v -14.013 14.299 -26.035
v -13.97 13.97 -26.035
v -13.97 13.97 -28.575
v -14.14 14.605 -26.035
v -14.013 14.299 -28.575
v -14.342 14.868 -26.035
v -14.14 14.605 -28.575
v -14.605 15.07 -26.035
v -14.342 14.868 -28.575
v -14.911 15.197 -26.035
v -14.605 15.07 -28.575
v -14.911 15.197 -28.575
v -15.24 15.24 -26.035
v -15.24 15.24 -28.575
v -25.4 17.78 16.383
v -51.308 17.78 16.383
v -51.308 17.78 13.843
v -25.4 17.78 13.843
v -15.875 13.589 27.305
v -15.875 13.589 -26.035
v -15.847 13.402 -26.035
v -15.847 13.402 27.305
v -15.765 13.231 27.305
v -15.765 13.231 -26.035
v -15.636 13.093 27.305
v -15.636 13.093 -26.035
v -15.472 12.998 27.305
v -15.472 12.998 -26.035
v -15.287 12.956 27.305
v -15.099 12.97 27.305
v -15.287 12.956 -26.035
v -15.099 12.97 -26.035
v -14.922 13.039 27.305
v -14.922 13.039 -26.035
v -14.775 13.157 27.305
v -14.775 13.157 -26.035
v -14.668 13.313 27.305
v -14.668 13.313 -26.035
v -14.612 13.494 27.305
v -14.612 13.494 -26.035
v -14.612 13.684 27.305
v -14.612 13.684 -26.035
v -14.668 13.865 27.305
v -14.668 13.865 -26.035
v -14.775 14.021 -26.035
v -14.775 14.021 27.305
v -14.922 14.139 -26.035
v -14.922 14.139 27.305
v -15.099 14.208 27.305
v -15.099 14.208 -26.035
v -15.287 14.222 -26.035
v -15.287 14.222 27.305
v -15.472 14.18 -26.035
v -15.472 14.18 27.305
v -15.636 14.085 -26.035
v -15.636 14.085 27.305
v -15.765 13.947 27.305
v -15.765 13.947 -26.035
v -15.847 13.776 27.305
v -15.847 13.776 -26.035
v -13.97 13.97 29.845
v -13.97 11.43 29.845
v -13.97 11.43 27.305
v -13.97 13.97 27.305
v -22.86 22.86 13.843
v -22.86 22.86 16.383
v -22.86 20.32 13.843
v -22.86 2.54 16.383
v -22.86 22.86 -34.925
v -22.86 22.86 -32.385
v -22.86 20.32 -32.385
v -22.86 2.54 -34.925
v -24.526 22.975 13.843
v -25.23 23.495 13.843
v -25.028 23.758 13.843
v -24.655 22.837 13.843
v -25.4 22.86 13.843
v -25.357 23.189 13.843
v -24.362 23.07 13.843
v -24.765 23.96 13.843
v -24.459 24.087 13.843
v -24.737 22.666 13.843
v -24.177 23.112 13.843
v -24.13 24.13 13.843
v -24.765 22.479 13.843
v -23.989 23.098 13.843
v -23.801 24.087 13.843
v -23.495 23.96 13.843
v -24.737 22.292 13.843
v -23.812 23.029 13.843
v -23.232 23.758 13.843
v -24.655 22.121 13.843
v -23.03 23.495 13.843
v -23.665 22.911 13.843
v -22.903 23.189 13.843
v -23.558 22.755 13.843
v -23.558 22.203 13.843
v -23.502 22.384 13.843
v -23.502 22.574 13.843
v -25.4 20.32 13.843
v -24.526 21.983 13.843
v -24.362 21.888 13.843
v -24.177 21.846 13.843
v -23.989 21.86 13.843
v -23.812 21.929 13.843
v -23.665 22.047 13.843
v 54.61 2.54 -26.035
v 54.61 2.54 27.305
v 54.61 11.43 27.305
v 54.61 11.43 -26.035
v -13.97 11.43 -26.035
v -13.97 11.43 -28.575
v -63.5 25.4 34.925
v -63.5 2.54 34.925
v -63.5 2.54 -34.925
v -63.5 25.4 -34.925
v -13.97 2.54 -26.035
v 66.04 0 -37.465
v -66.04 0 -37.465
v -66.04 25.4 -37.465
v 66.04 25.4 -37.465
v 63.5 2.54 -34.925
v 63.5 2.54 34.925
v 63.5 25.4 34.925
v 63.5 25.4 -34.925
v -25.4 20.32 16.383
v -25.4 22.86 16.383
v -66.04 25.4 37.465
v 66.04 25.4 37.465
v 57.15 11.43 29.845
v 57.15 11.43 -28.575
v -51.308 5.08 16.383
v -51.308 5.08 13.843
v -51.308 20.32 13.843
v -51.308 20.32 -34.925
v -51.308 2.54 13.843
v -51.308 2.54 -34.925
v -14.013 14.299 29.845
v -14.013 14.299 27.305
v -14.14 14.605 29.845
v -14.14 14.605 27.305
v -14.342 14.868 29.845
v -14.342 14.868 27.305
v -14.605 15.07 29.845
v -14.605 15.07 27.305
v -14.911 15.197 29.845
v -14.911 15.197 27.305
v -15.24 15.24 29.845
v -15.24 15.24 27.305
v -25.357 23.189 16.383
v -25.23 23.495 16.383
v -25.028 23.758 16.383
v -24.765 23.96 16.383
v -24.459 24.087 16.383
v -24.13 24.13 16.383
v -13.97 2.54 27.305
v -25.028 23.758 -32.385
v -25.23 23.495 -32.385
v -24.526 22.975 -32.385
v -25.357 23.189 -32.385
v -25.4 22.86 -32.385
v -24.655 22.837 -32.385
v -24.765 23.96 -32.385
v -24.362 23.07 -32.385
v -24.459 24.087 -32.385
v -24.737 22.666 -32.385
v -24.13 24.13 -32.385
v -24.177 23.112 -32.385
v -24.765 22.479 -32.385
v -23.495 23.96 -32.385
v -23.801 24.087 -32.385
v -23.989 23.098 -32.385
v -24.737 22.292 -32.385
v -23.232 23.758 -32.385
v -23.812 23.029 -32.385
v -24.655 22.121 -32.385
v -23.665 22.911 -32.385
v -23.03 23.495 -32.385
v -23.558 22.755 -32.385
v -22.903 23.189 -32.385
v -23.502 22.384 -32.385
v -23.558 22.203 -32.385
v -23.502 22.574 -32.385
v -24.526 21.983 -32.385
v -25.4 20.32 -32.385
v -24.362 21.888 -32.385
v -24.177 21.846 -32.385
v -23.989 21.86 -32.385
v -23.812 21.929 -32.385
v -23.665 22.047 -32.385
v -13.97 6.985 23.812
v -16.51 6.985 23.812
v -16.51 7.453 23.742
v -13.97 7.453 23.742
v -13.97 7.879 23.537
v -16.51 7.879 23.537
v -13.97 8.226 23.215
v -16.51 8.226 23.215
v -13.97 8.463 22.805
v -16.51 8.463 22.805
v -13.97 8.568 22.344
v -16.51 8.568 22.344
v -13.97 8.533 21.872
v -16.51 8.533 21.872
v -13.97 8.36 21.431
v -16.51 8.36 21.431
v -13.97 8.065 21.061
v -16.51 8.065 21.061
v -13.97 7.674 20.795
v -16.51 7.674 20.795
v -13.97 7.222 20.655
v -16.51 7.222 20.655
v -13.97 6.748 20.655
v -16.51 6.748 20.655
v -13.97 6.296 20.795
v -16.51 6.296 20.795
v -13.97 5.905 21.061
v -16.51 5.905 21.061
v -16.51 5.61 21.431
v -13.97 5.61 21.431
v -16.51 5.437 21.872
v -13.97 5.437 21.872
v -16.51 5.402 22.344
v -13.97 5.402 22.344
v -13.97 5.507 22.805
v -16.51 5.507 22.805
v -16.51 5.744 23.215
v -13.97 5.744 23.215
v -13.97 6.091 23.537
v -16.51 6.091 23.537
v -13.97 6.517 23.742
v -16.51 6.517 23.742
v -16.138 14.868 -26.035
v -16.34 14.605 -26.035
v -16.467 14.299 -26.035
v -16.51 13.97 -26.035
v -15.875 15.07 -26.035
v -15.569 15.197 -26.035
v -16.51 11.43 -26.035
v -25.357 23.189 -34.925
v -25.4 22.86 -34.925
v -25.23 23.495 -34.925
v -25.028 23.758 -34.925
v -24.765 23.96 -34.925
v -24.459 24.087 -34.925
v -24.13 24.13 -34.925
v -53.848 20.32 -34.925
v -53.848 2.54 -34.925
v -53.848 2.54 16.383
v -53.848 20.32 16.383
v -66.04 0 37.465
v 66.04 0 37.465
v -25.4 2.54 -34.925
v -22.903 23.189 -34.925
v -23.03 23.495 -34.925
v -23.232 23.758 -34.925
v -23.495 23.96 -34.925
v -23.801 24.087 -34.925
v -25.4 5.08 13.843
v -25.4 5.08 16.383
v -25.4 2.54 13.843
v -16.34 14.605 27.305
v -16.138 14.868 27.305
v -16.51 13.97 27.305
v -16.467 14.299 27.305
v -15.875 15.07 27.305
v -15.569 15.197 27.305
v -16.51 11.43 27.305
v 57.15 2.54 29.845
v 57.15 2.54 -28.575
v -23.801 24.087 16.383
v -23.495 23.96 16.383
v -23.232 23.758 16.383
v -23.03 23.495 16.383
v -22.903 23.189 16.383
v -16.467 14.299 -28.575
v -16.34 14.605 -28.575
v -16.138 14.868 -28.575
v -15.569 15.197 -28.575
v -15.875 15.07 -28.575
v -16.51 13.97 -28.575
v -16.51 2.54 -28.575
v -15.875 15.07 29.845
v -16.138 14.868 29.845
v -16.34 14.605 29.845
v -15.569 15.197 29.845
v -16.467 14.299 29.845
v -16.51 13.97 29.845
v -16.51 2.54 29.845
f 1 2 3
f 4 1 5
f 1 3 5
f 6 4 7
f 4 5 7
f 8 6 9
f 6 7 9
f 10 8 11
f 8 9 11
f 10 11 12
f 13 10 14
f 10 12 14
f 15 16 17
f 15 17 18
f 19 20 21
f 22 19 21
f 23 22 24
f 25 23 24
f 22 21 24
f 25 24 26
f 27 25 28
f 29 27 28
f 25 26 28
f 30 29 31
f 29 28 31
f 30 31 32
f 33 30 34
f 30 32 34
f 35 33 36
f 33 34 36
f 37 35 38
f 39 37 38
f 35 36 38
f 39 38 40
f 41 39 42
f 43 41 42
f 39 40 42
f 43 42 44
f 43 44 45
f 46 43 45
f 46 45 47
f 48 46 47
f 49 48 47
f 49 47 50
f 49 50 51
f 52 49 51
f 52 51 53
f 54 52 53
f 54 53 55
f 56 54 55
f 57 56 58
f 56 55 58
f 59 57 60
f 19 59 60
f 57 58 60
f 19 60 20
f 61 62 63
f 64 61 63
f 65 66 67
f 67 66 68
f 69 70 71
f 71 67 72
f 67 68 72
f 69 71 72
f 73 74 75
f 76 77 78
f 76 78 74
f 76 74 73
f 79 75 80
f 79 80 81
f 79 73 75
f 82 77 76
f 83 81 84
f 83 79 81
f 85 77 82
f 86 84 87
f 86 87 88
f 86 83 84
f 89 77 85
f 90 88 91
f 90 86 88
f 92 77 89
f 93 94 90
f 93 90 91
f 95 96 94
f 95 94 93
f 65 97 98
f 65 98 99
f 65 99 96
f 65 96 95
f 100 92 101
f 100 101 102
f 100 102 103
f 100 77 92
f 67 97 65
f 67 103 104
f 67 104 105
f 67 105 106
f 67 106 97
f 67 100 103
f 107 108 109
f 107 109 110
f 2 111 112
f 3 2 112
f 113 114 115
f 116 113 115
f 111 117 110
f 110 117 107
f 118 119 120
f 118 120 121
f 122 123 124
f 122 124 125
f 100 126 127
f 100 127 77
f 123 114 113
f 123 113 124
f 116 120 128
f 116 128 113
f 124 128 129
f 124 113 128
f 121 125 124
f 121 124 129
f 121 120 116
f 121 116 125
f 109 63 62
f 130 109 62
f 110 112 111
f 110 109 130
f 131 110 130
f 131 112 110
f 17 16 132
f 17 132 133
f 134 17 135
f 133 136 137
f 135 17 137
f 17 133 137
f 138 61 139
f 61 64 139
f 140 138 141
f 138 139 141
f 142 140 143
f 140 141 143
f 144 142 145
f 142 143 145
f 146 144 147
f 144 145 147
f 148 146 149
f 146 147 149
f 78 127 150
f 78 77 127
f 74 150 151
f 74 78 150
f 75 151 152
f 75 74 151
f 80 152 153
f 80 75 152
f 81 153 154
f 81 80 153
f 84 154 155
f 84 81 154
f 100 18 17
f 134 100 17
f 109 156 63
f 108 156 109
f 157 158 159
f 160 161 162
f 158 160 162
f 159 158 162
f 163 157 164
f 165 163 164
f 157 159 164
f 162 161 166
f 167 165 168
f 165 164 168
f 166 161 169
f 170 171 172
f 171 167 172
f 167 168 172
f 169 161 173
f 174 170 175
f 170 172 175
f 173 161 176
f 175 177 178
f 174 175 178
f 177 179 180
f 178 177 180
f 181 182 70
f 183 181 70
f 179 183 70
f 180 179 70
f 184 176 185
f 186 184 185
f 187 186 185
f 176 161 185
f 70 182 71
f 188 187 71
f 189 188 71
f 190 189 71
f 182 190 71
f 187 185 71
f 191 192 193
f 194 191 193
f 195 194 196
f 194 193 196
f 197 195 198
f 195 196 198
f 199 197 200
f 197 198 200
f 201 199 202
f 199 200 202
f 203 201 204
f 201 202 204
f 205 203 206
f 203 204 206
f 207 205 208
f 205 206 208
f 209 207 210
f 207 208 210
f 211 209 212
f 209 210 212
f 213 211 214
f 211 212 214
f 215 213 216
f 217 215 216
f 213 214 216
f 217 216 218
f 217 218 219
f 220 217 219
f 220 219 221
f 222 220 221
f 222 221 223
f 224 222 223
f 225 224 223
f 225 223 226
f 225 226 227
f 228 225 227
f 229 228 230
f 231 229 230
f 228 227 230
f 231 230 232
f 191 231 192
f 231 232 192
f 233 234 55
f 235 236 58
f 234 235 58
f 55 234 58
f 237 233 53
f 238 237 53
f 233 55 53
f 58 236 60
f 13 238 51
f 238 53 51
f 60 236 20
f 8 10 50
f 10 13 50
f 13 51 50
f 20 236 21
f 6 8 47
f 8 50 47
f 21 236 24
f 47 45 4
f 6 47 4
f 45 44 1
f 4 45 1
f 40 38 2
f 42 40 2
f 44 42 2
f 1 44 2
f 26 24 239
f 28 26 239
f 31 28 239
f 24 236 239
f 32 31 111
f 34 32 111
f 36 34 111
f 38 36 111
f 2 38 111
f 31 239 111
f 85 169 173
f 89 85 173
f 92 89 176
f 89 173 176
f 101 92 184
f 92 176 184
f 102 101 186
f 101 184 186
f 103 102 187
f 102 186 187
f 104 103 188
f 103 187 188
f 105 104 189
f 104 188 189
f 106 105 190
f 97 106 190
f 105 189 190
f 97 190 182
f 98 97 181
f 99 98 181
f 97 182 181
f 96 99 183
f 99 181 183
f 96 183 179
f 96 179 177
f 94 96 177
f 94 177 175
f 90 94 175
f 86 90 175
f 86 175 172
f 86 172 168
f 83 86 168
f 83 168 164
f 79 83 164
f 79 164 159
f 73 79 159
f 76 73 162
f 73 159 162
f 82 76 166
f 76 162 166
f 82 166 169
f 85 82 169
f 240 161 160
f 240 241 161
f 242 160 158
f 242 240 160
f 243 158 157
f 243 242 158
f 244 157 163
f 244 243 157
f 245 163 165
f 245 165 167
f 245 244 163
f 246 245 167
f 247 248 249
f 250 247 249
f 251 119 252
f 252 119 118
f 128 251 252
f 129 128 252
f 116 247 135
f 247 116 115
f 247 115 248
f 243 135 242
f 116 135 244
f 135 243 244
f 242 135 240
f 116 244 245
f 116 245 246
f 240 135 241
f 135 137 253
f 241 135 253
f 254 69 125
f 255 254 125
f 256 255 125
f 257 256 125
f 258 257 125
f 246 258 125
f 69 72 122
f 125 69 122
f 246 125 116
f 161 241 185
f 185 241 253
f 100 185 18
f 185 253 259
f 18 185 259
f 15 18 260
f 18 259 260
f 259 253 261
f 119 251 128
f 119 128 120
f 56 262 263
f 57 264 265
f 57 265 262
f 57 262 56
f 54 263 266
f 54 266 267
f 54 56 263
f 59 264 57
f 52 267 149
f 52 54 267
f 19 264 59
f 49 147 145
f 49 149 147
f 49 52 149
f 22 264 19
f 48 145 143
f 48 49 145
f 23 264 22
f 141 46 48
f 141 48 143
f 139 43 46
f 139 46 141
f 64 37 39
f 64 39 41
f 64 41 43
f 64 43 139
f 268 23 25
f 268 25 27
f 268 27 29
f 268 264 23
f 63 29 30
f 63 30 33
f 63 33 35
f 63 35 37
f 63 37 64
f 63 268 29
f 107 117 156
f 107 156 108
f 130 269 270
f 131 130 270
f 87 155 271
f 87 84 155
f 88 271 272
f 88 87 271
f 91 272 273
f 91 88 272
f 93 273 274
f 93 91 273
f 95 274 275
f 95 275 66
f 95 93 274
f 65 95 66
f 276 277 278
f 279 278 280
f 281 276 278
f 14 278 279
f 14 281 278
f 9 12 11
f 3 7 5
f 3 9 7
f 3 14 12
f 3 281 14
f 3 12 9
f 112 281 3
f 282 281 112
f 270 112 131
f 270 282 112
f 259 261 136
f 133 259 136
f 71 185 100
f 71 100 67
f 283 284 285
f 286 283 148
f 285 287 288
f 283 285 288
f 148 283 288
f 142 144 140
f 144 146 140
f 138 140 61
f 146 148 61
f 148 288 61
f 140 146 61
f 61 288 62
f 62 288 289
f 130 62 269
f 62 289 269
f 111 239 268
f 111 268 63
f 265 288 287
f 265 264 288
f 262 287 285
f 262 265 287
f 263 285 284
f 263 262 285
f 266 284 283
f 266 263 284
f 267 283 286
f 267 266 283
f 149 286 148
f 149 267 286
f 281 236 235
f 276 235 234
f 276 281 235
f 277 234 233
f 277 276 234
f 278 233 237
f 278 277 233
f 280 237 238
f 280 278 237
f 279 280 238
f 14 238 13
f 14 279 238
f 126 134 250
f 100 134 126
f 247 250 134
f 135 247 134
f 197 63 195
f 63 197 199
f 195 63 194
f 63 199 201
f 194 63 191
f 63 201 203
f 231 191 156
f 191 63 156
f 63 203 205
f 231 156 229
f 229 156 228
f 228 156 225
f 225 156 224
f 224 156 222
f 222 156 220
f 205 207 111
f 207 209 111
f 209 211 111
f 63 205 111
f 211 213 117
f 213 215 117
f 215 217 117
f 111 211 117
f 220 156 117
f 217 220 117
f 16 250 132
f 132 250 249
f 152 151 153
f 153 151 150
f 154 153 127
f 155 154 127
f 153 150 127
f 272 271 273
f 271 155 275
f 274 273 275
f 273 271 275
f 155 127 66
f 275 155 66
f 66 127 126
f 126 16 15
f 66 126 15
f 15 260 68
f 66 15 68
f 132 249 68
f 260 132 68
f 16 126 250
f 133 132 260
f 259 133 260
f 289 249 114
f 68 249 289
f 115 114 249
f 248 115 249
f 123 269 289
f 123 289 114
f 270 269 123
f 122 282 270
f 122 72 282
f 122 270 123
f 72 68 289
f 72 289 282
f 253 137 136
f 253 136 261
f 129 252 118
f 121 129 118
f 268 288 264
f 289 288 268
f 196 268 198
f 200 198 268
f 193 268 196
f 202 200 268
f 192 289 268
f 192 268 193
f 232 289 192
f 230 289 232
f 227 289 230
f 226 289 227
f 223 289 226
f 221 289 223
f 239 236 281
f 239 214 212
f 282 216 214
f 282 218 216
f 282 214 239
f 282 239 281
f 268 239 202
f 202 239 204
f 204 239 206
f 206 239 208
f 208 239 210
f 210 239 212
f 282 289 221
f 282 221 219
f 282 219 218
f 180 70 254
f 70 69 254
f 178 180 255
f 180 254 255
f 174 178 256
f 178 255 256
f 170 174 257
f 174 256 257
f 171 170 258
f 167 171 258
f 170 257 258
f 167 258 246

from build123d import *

# Parameters (mm, degrees)
SKETCH1_W              = 127
SKETCH1_H              = 69.85
BASE_DEPTH             = 2.54
SKETCH2_W              = 73.66
SKETCH2_H              = 58.42
SKETCH2_W_2            = 68.58
SKETCH2_H_2            = 53.34
PCB_HOLDER_DEPTH       = 8.89
SKETCH1_3_W            = 132.08
SKETCH1_3_H            = 74.93
SKETCH1_3_W_2          = 127
SKETCH1_3_H_2          = 69.85
BOSS_EXTRUDE5_DEPTH    = 25.4
BOSS_EXTRUDE6_DEPTH    = 17.78
SKETCH7_W              = 25.908
SKETCH7_H              = 12.7
BATTERY_GAP_DEPTH      = 2.54
SKETCH4_R              = 1.5875
WIRE_GAP_DEPTH         = 2.54
SKETCH8_W              = 2.54
SKETCH8_H              = 2.54
PCB_HOLDER_HINGE_DEPTH = 3.81
FILLET4_R              = 1.27
SKETCH13_R             = 0.635
BOSS_EXTRUDE10_DEPTH   = 53.34
SKETCH14_W             = 2.54
SKETCH14_H             = 2.54
BOSS_EXTRUDE11_DEPTH   = 3.81
FILLET5_R              = 1.27
SKETCH15_R             = 0.635
BOSS_EXTRUDE13_DEPTH   = 46.228


with BuildPart() as part:
    # Sketch1 → Base (new body)
    with BuildSketch(Plane(origin=(0, 0, 0), x_dir=(1, 0, 0), z_dir=(0, 1, 0))):
        Rectangle(SKETCH1_W, SKETCH1_H)
    extrude(amount=BASE_DEPTH)

    # Sketch2 → PCB-Holder (add)
    with BuildSketch(Plane(origin=(0, 2.54, 0), x_dir=(1, 0, 0), z_dir=(0, 1, 0))):
        with Locations((20.32, -0.635)):
            Rectangle(SKETCH2_W, SKETCH2_H)
        with Locations((20.32, -0.635)):
            Rectangle(SKETCH2_W_2, SKETCH2_H_2, mode=Mode.SUBTRACT)
    extrude(amount=PCB_HOLDER_DEPTH)

    # Sketch1<3> → Boss-Extrude5 (add)
    with BuildSketch(Plane(origin=(0, 0, 0), x_dir=(1, 0, 0), z_dir=(0, 1, 0))):
        Rectangle(SKETCH1_3_W, SKETCH1_3_H)
        Rectangle(SKETCH1_3_W_2, SKETCH1_3_H_2, mode=Mode.SUBTRACT)
    extrude(amount=BOSS_EXTRUDE5_DEPTH)

    # Sketch6 → Boss-Extrude6 (add)
    with BuildSketch(Plane(origin=(0, 2.54, 0), x_dir=(1, 0, 0), z_dir=(0, 1, 0))):
        Polygon((-51.308, -13.843), (-51.308, 34.925), (-53.848, 34.925), (-53.848, -16.383), (-22.86, -16.383), (-22.86, 34.925), (-25.4, 34.925), (-25.4, -13.843), align=None)
    extrude(amount=BOSS_EXTRUDE6_DEPTH)

    # Sketch7 → Battery-Gap (cut)
    with BuildSketch(Plane.XY.offset(16.383)):
        with Locations((-38.354, 11.43)):
            Rectangle(SKETCH7_W, SKETCH7_H)
    extrude(amount=-BATTERY_GAP_DEPTH, mode=Mode.SUBTRACT)

    # Sketch4 → Wire-Gap (cut)
    with BuildSketch(Plane.ZY.offset(16.51)):
        with Locations((22.225, 6.985)):
            Circle(SKETCH4_R)
    extrude(amount=-WIRE_GAP_DEPTH, mode=Mode.SUBTRACT)

    # Sketch8 → PCB-Holder-Hinge (add)
    with BuildSketch(Plane(origin=(0, 11.43, 0), x_dir=(1, 0, 0), z_dir=(0, 1, 0))):
        with Locations((-15.24, -28.575)):
            Rectangle(SKETCH8_W, SKETCH8_H)
        with Locations((-15.24, 27.305)):
            Rectangle(SKETCH8_W, SKETCH8_H)
    extrude(amount=PCB_HOLDER_HINGE_DEPTH)

    # Fillet4
    fillet4_edges = [part.edges().sort_by_distance(p)[0] for p in [
        (-16.51, 15.24, -27.305),
        (-13.97, 15.24, -27.305),
        (-13.97, 15.24, 28.575),
        (-16.51, 15.24, 28.575),
    ]]
    fillet(fillet4_edges, radius=FILLET4_R - 0.0001)  # a hair under: the kernel refuses the full size

    # Sketch13 → Boss-Extrude10 (add)
    with BuildSketch(Plane.XY.offset(-26.035)):
        with Locations(Location((-15.24, 13.589, 0), (0, 0, 180))):
            Circle(SKETCH13_R)
    extrude(amount=BOSS_EXTRUDE10_DEPTH)

    # Sketch14 → Boss-Extrude11 (add)
    with BuildSketch(Plane(origin=(0, 20.32, 0), x_dir=(1, 0, 0), z_dir=(0, 1, 0))):
        with Locations((-24.13, -15.113)):
            Rectangle(SKETCH14_W, SKETCH14_H)
        with Locations((-24.13, 33.655)):
            Rectangle(SKETCH14_W, SKETCH14_H)
    extrude(amount=BOSS_EXTRUDE11_DEPTH)

    # Fillet5
    fillet5_edges = [part.edges().sort_by_distance(p)[0] for p in [
        (-22.86, 24.13, -33.655),
        (-25.4, 24.13, -33.655),
        (-25.4, 24.13, 15.113),
        (-22.86, 24.13, 15.113),
    ]]
    fillet(fillet5_edges, radius=FILLET5_R - 0.0001)  # a hair under: the kernel refuses the full size

    # Sketch15 → Boss-Extrude13 (add)
    with BuildSketch(Plane.XY.offset(-32.385)):
        with Locations(Location((-24.13, 22.479, 0), (0, 0, 180))):
            Circle(SKETCH15_R)
    extrude(amount=BOSS_EXTRUDE13_DEPTH)


solid = part.part
